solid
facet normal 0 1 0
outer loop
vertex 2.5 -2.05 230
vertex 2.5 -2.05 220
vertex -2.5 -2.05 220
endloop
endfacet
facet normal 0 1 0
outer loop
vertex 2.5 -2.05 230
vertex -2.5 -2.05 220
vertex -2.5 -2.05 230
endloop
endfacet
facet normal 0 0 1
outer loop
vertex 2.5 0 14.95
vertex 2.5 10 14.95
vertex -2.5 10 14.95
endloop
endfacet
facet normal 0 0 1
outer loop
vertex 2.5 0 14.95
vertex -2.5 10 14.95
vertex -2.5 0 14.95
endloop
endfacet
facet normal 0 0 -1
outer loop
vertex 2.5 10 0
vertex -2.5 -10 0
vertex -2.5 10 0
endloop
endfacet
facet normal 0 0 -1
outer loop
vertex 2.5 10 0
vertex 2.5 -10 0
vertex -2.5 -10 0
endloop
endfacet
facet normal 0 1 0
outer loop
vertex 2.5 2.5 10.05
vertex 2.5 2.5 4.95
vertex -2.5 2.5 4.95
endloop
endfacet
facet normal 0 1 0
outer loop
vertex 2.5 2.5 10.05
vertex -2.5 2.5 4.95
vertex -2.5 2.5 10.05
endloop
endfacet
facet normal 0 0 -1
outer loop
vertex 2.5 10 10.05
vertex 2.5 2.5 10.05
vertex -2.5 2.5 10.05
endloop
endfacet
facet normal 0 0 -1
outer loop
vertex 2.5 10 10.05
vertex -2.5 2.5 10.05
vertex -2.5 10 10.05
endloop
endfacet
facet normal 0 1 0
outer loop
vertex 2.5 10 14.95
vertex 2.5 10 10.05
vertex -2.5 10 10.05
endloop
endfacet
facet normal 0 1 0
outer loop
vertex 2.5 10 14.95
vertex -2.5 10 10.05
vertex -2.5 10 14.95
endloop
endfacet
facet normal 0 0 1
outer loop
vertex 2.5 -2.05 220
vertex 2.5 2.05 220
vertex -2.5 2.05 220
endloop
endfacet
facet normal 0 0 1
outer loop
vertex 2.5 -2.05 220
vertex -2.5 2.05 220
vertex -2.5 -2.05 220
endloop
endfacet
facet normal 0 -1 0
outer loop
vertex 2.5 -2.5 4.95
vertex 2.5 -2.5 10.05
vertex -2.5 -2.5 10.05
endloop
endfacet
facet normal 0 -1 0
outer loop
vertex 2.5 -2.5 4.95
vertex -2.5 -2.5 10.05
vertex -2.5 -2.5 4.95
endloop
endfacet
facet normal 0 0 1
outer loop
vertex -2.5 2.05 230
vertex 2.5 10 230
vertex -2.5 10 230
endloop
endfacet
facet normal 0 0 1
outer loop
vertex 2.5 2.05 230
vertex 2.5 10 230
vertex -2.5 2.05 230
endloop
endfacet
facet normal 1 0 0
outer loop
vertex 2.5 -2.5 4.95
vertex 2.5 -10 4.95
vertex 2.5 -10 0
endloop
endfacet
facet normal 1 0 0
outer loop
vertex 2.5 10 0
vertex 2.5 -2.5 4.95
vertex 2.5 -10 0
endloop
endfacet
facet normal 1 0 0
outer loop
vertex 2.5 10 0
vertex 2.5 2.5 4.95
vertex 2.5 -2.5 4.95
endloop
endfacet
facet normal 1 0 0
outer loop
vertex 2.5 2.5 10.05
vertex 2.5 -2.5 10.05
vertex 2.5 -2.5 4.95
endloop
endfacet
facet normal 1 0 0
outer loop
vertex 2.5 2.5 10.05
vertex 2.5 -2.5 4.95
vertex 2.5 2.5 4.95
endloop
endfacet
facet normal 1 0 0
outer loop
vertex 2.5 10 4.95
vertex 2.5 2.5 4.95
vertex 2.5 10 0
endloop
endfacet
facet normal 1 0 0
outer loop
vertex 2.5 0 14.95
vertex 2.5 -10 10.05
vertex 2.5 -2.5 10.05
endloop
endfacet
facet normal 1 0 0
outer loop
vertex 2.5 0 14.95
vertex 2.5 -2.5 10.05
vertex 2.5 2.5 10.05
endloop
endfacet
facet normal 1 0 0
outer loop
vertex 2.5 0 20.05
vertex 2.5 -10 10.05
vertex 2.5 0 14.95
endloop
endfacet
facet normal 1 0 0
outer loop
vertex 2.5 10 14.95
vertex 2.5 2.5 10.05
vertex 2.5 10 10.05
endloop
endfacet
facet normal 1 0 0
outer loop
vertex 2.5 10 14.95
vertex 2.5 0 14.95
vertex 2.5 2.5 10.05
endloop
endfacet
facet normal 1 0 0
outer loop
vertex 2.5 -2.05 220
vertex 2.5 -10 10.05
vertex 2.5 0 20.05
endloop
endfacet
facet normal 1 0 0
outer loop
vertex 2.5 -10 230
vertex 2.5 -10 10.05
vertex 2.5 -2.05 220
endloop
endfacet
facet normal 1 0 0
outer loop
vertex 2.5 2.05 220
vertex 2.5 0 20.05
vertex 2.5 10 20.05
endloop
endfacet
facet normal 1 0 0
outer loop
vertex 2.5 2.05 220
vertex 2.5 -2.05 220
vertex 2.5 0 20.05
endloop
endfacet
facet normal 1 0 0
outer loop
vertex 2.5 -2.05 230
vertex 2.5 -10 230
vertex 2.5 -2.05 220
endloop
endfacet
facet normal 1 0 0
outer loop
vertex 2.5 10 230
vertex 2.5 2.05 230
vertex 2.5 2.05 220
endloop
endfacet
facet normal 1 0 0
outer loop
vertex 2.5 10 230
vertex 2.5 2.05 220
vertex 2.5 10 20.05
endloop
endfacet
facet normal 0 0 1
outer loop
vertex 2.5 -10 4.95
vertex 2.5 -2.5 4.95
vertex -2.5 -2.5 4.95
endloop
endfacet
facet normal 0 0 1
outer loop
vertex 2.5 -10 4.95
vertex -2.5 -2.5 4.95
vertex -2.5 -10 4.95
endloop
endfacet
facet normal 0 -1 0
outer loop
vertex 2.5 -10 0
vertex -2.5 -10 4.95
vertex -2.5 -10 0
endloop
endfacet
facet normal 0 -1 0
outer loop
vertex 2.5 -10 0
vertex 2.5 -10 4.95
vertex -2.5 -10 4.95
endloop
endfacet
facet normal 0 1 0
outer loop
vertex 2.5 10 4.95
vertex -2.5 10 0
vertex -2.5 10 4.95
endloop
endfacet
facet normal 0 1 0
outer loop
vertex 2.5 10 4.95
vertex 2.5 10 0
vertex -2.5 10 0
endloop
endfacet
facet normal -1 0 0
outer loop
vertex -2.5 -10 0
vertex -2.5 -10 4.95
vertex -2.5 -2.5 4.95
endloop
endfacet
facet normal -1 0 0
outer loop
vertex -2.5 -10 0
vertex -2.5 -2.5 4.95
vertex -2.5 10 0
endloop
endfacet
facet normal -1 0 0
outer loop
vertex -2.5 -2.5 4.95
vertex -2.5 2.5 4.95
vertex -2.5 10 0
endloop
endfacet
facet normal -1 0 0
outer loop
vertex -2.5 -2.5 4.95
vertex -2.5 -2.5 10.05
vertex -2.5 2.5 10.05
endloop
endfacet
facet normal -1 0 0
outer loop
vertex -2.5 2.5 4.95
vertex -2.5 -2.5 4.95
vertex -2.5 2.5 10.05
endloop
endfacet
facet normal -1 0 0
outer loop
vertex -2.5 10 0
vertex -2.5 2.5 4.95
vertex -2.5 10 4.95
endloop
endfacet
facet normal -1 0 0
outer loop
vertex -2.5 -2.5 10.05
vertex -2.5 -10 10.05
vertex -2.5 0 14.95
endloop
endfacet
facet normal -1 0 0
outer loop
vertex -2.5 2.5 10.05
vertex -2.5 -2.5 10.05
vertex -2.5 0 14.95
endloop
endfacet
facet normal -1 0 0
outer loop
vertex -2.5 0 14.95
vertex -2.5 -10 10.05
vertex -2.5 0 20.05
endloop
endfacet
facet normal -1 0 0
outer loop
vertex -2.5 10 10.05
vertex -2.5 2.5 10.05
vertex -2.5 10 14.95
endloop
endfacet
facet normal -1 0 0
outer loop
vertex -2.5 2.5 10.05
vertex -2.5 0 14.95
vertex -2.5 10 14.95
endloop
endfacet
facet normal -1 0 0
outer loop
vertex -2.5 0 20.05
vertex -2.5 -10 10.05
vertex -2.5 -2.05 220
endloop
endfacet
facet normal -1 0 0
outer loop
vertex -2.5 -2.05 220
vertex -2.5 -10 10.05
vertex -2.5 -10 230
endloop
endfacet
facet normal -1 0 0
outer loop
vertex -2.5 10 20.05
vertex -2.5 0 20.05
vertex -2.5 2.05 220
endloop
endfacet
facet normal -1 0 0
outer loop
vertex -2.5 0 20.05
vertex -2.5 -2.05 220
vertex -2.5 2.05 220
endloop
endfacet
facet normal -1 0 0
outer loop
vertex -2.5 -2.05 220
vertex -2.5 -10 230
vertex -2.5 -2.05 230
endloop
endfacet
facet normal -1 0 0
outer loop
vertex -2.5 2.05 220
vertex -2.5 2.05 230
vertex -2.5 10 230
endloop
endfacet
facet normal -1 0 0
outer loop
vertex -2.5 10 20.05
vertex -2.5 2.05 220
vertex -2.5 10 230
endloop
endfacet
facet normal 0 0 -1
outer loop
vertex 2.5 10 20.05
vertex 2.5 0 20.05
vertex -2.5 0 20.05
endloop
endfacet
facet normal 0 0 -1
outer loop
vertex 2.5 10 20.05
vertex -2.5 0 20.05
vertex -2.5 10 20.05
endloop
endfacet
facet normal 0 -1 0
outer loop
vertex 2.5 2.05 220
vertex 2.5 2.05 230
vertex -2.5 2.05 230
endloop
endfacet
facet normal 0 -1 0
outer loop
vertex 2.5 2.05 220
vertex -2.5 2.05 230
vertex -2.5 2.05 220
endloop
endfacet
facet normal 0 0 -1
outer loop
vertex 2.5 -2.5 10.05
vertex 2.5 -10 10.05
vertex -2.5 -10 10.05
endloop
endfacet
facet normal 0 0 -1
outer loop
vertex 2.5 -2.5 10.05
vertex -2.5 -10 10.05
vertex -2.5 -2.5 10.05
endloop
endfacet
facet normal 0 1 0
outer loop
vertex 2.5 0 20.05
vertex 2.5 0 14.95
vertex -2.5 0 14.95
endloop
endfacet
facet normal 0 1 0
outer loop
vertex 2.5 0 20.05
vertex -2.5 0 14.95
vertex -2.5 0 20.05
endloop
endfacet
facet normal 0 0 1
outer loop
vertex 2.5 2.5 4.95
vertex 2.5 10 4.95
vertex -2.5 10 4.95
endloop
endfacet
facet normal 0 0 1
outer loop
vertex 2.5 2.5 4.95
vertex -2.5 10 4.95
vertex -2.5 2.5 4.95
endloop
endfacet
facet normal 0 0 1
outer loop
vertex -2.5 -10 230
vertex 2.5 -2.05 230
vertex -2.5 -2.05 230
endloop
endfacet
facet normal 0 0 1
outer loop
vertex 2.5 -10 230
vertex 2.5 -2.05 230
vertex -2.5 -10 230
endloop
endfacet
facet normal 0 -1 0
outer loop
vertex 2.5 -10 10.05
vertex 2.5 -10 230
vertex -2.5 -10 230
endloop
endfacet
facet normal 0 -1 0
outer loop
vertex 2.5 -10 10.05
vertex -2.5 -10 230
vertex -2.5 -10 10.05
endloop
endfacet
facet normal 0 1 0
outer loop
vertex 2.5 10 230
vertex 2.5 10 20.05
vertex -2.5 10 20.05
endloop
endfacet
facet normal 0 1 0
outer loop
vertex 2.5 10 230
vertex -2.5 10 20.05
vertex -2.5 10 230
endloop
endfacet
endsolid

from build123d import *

# Parameters (mm, degrees)
PAD_DEPTH = 2.5


with BuildPart() as part:
    # Sketch → Pad (new body, symmetric)
    with BuildSketch(Plane.YZ):
        Polygon((10, 0), (10, 4.95), (2.5, 4.95), (2.5, 10.05), (10, 10.05), (10, 14.95), (0, 14.95), (0, 20.05), (10, 20.05), (10, 230), (2.05, 230), (2.05, 220), (-2.05, 220), (-2.05, 230), (-10, 230), (-10, 10.05), (-2.5, 10.05), (-2.5, 4.95), (-10, 4.95), (-10, 0), align=None)
    extrude(amount=PAD_DEPTH, both=True)


solid = part.part
